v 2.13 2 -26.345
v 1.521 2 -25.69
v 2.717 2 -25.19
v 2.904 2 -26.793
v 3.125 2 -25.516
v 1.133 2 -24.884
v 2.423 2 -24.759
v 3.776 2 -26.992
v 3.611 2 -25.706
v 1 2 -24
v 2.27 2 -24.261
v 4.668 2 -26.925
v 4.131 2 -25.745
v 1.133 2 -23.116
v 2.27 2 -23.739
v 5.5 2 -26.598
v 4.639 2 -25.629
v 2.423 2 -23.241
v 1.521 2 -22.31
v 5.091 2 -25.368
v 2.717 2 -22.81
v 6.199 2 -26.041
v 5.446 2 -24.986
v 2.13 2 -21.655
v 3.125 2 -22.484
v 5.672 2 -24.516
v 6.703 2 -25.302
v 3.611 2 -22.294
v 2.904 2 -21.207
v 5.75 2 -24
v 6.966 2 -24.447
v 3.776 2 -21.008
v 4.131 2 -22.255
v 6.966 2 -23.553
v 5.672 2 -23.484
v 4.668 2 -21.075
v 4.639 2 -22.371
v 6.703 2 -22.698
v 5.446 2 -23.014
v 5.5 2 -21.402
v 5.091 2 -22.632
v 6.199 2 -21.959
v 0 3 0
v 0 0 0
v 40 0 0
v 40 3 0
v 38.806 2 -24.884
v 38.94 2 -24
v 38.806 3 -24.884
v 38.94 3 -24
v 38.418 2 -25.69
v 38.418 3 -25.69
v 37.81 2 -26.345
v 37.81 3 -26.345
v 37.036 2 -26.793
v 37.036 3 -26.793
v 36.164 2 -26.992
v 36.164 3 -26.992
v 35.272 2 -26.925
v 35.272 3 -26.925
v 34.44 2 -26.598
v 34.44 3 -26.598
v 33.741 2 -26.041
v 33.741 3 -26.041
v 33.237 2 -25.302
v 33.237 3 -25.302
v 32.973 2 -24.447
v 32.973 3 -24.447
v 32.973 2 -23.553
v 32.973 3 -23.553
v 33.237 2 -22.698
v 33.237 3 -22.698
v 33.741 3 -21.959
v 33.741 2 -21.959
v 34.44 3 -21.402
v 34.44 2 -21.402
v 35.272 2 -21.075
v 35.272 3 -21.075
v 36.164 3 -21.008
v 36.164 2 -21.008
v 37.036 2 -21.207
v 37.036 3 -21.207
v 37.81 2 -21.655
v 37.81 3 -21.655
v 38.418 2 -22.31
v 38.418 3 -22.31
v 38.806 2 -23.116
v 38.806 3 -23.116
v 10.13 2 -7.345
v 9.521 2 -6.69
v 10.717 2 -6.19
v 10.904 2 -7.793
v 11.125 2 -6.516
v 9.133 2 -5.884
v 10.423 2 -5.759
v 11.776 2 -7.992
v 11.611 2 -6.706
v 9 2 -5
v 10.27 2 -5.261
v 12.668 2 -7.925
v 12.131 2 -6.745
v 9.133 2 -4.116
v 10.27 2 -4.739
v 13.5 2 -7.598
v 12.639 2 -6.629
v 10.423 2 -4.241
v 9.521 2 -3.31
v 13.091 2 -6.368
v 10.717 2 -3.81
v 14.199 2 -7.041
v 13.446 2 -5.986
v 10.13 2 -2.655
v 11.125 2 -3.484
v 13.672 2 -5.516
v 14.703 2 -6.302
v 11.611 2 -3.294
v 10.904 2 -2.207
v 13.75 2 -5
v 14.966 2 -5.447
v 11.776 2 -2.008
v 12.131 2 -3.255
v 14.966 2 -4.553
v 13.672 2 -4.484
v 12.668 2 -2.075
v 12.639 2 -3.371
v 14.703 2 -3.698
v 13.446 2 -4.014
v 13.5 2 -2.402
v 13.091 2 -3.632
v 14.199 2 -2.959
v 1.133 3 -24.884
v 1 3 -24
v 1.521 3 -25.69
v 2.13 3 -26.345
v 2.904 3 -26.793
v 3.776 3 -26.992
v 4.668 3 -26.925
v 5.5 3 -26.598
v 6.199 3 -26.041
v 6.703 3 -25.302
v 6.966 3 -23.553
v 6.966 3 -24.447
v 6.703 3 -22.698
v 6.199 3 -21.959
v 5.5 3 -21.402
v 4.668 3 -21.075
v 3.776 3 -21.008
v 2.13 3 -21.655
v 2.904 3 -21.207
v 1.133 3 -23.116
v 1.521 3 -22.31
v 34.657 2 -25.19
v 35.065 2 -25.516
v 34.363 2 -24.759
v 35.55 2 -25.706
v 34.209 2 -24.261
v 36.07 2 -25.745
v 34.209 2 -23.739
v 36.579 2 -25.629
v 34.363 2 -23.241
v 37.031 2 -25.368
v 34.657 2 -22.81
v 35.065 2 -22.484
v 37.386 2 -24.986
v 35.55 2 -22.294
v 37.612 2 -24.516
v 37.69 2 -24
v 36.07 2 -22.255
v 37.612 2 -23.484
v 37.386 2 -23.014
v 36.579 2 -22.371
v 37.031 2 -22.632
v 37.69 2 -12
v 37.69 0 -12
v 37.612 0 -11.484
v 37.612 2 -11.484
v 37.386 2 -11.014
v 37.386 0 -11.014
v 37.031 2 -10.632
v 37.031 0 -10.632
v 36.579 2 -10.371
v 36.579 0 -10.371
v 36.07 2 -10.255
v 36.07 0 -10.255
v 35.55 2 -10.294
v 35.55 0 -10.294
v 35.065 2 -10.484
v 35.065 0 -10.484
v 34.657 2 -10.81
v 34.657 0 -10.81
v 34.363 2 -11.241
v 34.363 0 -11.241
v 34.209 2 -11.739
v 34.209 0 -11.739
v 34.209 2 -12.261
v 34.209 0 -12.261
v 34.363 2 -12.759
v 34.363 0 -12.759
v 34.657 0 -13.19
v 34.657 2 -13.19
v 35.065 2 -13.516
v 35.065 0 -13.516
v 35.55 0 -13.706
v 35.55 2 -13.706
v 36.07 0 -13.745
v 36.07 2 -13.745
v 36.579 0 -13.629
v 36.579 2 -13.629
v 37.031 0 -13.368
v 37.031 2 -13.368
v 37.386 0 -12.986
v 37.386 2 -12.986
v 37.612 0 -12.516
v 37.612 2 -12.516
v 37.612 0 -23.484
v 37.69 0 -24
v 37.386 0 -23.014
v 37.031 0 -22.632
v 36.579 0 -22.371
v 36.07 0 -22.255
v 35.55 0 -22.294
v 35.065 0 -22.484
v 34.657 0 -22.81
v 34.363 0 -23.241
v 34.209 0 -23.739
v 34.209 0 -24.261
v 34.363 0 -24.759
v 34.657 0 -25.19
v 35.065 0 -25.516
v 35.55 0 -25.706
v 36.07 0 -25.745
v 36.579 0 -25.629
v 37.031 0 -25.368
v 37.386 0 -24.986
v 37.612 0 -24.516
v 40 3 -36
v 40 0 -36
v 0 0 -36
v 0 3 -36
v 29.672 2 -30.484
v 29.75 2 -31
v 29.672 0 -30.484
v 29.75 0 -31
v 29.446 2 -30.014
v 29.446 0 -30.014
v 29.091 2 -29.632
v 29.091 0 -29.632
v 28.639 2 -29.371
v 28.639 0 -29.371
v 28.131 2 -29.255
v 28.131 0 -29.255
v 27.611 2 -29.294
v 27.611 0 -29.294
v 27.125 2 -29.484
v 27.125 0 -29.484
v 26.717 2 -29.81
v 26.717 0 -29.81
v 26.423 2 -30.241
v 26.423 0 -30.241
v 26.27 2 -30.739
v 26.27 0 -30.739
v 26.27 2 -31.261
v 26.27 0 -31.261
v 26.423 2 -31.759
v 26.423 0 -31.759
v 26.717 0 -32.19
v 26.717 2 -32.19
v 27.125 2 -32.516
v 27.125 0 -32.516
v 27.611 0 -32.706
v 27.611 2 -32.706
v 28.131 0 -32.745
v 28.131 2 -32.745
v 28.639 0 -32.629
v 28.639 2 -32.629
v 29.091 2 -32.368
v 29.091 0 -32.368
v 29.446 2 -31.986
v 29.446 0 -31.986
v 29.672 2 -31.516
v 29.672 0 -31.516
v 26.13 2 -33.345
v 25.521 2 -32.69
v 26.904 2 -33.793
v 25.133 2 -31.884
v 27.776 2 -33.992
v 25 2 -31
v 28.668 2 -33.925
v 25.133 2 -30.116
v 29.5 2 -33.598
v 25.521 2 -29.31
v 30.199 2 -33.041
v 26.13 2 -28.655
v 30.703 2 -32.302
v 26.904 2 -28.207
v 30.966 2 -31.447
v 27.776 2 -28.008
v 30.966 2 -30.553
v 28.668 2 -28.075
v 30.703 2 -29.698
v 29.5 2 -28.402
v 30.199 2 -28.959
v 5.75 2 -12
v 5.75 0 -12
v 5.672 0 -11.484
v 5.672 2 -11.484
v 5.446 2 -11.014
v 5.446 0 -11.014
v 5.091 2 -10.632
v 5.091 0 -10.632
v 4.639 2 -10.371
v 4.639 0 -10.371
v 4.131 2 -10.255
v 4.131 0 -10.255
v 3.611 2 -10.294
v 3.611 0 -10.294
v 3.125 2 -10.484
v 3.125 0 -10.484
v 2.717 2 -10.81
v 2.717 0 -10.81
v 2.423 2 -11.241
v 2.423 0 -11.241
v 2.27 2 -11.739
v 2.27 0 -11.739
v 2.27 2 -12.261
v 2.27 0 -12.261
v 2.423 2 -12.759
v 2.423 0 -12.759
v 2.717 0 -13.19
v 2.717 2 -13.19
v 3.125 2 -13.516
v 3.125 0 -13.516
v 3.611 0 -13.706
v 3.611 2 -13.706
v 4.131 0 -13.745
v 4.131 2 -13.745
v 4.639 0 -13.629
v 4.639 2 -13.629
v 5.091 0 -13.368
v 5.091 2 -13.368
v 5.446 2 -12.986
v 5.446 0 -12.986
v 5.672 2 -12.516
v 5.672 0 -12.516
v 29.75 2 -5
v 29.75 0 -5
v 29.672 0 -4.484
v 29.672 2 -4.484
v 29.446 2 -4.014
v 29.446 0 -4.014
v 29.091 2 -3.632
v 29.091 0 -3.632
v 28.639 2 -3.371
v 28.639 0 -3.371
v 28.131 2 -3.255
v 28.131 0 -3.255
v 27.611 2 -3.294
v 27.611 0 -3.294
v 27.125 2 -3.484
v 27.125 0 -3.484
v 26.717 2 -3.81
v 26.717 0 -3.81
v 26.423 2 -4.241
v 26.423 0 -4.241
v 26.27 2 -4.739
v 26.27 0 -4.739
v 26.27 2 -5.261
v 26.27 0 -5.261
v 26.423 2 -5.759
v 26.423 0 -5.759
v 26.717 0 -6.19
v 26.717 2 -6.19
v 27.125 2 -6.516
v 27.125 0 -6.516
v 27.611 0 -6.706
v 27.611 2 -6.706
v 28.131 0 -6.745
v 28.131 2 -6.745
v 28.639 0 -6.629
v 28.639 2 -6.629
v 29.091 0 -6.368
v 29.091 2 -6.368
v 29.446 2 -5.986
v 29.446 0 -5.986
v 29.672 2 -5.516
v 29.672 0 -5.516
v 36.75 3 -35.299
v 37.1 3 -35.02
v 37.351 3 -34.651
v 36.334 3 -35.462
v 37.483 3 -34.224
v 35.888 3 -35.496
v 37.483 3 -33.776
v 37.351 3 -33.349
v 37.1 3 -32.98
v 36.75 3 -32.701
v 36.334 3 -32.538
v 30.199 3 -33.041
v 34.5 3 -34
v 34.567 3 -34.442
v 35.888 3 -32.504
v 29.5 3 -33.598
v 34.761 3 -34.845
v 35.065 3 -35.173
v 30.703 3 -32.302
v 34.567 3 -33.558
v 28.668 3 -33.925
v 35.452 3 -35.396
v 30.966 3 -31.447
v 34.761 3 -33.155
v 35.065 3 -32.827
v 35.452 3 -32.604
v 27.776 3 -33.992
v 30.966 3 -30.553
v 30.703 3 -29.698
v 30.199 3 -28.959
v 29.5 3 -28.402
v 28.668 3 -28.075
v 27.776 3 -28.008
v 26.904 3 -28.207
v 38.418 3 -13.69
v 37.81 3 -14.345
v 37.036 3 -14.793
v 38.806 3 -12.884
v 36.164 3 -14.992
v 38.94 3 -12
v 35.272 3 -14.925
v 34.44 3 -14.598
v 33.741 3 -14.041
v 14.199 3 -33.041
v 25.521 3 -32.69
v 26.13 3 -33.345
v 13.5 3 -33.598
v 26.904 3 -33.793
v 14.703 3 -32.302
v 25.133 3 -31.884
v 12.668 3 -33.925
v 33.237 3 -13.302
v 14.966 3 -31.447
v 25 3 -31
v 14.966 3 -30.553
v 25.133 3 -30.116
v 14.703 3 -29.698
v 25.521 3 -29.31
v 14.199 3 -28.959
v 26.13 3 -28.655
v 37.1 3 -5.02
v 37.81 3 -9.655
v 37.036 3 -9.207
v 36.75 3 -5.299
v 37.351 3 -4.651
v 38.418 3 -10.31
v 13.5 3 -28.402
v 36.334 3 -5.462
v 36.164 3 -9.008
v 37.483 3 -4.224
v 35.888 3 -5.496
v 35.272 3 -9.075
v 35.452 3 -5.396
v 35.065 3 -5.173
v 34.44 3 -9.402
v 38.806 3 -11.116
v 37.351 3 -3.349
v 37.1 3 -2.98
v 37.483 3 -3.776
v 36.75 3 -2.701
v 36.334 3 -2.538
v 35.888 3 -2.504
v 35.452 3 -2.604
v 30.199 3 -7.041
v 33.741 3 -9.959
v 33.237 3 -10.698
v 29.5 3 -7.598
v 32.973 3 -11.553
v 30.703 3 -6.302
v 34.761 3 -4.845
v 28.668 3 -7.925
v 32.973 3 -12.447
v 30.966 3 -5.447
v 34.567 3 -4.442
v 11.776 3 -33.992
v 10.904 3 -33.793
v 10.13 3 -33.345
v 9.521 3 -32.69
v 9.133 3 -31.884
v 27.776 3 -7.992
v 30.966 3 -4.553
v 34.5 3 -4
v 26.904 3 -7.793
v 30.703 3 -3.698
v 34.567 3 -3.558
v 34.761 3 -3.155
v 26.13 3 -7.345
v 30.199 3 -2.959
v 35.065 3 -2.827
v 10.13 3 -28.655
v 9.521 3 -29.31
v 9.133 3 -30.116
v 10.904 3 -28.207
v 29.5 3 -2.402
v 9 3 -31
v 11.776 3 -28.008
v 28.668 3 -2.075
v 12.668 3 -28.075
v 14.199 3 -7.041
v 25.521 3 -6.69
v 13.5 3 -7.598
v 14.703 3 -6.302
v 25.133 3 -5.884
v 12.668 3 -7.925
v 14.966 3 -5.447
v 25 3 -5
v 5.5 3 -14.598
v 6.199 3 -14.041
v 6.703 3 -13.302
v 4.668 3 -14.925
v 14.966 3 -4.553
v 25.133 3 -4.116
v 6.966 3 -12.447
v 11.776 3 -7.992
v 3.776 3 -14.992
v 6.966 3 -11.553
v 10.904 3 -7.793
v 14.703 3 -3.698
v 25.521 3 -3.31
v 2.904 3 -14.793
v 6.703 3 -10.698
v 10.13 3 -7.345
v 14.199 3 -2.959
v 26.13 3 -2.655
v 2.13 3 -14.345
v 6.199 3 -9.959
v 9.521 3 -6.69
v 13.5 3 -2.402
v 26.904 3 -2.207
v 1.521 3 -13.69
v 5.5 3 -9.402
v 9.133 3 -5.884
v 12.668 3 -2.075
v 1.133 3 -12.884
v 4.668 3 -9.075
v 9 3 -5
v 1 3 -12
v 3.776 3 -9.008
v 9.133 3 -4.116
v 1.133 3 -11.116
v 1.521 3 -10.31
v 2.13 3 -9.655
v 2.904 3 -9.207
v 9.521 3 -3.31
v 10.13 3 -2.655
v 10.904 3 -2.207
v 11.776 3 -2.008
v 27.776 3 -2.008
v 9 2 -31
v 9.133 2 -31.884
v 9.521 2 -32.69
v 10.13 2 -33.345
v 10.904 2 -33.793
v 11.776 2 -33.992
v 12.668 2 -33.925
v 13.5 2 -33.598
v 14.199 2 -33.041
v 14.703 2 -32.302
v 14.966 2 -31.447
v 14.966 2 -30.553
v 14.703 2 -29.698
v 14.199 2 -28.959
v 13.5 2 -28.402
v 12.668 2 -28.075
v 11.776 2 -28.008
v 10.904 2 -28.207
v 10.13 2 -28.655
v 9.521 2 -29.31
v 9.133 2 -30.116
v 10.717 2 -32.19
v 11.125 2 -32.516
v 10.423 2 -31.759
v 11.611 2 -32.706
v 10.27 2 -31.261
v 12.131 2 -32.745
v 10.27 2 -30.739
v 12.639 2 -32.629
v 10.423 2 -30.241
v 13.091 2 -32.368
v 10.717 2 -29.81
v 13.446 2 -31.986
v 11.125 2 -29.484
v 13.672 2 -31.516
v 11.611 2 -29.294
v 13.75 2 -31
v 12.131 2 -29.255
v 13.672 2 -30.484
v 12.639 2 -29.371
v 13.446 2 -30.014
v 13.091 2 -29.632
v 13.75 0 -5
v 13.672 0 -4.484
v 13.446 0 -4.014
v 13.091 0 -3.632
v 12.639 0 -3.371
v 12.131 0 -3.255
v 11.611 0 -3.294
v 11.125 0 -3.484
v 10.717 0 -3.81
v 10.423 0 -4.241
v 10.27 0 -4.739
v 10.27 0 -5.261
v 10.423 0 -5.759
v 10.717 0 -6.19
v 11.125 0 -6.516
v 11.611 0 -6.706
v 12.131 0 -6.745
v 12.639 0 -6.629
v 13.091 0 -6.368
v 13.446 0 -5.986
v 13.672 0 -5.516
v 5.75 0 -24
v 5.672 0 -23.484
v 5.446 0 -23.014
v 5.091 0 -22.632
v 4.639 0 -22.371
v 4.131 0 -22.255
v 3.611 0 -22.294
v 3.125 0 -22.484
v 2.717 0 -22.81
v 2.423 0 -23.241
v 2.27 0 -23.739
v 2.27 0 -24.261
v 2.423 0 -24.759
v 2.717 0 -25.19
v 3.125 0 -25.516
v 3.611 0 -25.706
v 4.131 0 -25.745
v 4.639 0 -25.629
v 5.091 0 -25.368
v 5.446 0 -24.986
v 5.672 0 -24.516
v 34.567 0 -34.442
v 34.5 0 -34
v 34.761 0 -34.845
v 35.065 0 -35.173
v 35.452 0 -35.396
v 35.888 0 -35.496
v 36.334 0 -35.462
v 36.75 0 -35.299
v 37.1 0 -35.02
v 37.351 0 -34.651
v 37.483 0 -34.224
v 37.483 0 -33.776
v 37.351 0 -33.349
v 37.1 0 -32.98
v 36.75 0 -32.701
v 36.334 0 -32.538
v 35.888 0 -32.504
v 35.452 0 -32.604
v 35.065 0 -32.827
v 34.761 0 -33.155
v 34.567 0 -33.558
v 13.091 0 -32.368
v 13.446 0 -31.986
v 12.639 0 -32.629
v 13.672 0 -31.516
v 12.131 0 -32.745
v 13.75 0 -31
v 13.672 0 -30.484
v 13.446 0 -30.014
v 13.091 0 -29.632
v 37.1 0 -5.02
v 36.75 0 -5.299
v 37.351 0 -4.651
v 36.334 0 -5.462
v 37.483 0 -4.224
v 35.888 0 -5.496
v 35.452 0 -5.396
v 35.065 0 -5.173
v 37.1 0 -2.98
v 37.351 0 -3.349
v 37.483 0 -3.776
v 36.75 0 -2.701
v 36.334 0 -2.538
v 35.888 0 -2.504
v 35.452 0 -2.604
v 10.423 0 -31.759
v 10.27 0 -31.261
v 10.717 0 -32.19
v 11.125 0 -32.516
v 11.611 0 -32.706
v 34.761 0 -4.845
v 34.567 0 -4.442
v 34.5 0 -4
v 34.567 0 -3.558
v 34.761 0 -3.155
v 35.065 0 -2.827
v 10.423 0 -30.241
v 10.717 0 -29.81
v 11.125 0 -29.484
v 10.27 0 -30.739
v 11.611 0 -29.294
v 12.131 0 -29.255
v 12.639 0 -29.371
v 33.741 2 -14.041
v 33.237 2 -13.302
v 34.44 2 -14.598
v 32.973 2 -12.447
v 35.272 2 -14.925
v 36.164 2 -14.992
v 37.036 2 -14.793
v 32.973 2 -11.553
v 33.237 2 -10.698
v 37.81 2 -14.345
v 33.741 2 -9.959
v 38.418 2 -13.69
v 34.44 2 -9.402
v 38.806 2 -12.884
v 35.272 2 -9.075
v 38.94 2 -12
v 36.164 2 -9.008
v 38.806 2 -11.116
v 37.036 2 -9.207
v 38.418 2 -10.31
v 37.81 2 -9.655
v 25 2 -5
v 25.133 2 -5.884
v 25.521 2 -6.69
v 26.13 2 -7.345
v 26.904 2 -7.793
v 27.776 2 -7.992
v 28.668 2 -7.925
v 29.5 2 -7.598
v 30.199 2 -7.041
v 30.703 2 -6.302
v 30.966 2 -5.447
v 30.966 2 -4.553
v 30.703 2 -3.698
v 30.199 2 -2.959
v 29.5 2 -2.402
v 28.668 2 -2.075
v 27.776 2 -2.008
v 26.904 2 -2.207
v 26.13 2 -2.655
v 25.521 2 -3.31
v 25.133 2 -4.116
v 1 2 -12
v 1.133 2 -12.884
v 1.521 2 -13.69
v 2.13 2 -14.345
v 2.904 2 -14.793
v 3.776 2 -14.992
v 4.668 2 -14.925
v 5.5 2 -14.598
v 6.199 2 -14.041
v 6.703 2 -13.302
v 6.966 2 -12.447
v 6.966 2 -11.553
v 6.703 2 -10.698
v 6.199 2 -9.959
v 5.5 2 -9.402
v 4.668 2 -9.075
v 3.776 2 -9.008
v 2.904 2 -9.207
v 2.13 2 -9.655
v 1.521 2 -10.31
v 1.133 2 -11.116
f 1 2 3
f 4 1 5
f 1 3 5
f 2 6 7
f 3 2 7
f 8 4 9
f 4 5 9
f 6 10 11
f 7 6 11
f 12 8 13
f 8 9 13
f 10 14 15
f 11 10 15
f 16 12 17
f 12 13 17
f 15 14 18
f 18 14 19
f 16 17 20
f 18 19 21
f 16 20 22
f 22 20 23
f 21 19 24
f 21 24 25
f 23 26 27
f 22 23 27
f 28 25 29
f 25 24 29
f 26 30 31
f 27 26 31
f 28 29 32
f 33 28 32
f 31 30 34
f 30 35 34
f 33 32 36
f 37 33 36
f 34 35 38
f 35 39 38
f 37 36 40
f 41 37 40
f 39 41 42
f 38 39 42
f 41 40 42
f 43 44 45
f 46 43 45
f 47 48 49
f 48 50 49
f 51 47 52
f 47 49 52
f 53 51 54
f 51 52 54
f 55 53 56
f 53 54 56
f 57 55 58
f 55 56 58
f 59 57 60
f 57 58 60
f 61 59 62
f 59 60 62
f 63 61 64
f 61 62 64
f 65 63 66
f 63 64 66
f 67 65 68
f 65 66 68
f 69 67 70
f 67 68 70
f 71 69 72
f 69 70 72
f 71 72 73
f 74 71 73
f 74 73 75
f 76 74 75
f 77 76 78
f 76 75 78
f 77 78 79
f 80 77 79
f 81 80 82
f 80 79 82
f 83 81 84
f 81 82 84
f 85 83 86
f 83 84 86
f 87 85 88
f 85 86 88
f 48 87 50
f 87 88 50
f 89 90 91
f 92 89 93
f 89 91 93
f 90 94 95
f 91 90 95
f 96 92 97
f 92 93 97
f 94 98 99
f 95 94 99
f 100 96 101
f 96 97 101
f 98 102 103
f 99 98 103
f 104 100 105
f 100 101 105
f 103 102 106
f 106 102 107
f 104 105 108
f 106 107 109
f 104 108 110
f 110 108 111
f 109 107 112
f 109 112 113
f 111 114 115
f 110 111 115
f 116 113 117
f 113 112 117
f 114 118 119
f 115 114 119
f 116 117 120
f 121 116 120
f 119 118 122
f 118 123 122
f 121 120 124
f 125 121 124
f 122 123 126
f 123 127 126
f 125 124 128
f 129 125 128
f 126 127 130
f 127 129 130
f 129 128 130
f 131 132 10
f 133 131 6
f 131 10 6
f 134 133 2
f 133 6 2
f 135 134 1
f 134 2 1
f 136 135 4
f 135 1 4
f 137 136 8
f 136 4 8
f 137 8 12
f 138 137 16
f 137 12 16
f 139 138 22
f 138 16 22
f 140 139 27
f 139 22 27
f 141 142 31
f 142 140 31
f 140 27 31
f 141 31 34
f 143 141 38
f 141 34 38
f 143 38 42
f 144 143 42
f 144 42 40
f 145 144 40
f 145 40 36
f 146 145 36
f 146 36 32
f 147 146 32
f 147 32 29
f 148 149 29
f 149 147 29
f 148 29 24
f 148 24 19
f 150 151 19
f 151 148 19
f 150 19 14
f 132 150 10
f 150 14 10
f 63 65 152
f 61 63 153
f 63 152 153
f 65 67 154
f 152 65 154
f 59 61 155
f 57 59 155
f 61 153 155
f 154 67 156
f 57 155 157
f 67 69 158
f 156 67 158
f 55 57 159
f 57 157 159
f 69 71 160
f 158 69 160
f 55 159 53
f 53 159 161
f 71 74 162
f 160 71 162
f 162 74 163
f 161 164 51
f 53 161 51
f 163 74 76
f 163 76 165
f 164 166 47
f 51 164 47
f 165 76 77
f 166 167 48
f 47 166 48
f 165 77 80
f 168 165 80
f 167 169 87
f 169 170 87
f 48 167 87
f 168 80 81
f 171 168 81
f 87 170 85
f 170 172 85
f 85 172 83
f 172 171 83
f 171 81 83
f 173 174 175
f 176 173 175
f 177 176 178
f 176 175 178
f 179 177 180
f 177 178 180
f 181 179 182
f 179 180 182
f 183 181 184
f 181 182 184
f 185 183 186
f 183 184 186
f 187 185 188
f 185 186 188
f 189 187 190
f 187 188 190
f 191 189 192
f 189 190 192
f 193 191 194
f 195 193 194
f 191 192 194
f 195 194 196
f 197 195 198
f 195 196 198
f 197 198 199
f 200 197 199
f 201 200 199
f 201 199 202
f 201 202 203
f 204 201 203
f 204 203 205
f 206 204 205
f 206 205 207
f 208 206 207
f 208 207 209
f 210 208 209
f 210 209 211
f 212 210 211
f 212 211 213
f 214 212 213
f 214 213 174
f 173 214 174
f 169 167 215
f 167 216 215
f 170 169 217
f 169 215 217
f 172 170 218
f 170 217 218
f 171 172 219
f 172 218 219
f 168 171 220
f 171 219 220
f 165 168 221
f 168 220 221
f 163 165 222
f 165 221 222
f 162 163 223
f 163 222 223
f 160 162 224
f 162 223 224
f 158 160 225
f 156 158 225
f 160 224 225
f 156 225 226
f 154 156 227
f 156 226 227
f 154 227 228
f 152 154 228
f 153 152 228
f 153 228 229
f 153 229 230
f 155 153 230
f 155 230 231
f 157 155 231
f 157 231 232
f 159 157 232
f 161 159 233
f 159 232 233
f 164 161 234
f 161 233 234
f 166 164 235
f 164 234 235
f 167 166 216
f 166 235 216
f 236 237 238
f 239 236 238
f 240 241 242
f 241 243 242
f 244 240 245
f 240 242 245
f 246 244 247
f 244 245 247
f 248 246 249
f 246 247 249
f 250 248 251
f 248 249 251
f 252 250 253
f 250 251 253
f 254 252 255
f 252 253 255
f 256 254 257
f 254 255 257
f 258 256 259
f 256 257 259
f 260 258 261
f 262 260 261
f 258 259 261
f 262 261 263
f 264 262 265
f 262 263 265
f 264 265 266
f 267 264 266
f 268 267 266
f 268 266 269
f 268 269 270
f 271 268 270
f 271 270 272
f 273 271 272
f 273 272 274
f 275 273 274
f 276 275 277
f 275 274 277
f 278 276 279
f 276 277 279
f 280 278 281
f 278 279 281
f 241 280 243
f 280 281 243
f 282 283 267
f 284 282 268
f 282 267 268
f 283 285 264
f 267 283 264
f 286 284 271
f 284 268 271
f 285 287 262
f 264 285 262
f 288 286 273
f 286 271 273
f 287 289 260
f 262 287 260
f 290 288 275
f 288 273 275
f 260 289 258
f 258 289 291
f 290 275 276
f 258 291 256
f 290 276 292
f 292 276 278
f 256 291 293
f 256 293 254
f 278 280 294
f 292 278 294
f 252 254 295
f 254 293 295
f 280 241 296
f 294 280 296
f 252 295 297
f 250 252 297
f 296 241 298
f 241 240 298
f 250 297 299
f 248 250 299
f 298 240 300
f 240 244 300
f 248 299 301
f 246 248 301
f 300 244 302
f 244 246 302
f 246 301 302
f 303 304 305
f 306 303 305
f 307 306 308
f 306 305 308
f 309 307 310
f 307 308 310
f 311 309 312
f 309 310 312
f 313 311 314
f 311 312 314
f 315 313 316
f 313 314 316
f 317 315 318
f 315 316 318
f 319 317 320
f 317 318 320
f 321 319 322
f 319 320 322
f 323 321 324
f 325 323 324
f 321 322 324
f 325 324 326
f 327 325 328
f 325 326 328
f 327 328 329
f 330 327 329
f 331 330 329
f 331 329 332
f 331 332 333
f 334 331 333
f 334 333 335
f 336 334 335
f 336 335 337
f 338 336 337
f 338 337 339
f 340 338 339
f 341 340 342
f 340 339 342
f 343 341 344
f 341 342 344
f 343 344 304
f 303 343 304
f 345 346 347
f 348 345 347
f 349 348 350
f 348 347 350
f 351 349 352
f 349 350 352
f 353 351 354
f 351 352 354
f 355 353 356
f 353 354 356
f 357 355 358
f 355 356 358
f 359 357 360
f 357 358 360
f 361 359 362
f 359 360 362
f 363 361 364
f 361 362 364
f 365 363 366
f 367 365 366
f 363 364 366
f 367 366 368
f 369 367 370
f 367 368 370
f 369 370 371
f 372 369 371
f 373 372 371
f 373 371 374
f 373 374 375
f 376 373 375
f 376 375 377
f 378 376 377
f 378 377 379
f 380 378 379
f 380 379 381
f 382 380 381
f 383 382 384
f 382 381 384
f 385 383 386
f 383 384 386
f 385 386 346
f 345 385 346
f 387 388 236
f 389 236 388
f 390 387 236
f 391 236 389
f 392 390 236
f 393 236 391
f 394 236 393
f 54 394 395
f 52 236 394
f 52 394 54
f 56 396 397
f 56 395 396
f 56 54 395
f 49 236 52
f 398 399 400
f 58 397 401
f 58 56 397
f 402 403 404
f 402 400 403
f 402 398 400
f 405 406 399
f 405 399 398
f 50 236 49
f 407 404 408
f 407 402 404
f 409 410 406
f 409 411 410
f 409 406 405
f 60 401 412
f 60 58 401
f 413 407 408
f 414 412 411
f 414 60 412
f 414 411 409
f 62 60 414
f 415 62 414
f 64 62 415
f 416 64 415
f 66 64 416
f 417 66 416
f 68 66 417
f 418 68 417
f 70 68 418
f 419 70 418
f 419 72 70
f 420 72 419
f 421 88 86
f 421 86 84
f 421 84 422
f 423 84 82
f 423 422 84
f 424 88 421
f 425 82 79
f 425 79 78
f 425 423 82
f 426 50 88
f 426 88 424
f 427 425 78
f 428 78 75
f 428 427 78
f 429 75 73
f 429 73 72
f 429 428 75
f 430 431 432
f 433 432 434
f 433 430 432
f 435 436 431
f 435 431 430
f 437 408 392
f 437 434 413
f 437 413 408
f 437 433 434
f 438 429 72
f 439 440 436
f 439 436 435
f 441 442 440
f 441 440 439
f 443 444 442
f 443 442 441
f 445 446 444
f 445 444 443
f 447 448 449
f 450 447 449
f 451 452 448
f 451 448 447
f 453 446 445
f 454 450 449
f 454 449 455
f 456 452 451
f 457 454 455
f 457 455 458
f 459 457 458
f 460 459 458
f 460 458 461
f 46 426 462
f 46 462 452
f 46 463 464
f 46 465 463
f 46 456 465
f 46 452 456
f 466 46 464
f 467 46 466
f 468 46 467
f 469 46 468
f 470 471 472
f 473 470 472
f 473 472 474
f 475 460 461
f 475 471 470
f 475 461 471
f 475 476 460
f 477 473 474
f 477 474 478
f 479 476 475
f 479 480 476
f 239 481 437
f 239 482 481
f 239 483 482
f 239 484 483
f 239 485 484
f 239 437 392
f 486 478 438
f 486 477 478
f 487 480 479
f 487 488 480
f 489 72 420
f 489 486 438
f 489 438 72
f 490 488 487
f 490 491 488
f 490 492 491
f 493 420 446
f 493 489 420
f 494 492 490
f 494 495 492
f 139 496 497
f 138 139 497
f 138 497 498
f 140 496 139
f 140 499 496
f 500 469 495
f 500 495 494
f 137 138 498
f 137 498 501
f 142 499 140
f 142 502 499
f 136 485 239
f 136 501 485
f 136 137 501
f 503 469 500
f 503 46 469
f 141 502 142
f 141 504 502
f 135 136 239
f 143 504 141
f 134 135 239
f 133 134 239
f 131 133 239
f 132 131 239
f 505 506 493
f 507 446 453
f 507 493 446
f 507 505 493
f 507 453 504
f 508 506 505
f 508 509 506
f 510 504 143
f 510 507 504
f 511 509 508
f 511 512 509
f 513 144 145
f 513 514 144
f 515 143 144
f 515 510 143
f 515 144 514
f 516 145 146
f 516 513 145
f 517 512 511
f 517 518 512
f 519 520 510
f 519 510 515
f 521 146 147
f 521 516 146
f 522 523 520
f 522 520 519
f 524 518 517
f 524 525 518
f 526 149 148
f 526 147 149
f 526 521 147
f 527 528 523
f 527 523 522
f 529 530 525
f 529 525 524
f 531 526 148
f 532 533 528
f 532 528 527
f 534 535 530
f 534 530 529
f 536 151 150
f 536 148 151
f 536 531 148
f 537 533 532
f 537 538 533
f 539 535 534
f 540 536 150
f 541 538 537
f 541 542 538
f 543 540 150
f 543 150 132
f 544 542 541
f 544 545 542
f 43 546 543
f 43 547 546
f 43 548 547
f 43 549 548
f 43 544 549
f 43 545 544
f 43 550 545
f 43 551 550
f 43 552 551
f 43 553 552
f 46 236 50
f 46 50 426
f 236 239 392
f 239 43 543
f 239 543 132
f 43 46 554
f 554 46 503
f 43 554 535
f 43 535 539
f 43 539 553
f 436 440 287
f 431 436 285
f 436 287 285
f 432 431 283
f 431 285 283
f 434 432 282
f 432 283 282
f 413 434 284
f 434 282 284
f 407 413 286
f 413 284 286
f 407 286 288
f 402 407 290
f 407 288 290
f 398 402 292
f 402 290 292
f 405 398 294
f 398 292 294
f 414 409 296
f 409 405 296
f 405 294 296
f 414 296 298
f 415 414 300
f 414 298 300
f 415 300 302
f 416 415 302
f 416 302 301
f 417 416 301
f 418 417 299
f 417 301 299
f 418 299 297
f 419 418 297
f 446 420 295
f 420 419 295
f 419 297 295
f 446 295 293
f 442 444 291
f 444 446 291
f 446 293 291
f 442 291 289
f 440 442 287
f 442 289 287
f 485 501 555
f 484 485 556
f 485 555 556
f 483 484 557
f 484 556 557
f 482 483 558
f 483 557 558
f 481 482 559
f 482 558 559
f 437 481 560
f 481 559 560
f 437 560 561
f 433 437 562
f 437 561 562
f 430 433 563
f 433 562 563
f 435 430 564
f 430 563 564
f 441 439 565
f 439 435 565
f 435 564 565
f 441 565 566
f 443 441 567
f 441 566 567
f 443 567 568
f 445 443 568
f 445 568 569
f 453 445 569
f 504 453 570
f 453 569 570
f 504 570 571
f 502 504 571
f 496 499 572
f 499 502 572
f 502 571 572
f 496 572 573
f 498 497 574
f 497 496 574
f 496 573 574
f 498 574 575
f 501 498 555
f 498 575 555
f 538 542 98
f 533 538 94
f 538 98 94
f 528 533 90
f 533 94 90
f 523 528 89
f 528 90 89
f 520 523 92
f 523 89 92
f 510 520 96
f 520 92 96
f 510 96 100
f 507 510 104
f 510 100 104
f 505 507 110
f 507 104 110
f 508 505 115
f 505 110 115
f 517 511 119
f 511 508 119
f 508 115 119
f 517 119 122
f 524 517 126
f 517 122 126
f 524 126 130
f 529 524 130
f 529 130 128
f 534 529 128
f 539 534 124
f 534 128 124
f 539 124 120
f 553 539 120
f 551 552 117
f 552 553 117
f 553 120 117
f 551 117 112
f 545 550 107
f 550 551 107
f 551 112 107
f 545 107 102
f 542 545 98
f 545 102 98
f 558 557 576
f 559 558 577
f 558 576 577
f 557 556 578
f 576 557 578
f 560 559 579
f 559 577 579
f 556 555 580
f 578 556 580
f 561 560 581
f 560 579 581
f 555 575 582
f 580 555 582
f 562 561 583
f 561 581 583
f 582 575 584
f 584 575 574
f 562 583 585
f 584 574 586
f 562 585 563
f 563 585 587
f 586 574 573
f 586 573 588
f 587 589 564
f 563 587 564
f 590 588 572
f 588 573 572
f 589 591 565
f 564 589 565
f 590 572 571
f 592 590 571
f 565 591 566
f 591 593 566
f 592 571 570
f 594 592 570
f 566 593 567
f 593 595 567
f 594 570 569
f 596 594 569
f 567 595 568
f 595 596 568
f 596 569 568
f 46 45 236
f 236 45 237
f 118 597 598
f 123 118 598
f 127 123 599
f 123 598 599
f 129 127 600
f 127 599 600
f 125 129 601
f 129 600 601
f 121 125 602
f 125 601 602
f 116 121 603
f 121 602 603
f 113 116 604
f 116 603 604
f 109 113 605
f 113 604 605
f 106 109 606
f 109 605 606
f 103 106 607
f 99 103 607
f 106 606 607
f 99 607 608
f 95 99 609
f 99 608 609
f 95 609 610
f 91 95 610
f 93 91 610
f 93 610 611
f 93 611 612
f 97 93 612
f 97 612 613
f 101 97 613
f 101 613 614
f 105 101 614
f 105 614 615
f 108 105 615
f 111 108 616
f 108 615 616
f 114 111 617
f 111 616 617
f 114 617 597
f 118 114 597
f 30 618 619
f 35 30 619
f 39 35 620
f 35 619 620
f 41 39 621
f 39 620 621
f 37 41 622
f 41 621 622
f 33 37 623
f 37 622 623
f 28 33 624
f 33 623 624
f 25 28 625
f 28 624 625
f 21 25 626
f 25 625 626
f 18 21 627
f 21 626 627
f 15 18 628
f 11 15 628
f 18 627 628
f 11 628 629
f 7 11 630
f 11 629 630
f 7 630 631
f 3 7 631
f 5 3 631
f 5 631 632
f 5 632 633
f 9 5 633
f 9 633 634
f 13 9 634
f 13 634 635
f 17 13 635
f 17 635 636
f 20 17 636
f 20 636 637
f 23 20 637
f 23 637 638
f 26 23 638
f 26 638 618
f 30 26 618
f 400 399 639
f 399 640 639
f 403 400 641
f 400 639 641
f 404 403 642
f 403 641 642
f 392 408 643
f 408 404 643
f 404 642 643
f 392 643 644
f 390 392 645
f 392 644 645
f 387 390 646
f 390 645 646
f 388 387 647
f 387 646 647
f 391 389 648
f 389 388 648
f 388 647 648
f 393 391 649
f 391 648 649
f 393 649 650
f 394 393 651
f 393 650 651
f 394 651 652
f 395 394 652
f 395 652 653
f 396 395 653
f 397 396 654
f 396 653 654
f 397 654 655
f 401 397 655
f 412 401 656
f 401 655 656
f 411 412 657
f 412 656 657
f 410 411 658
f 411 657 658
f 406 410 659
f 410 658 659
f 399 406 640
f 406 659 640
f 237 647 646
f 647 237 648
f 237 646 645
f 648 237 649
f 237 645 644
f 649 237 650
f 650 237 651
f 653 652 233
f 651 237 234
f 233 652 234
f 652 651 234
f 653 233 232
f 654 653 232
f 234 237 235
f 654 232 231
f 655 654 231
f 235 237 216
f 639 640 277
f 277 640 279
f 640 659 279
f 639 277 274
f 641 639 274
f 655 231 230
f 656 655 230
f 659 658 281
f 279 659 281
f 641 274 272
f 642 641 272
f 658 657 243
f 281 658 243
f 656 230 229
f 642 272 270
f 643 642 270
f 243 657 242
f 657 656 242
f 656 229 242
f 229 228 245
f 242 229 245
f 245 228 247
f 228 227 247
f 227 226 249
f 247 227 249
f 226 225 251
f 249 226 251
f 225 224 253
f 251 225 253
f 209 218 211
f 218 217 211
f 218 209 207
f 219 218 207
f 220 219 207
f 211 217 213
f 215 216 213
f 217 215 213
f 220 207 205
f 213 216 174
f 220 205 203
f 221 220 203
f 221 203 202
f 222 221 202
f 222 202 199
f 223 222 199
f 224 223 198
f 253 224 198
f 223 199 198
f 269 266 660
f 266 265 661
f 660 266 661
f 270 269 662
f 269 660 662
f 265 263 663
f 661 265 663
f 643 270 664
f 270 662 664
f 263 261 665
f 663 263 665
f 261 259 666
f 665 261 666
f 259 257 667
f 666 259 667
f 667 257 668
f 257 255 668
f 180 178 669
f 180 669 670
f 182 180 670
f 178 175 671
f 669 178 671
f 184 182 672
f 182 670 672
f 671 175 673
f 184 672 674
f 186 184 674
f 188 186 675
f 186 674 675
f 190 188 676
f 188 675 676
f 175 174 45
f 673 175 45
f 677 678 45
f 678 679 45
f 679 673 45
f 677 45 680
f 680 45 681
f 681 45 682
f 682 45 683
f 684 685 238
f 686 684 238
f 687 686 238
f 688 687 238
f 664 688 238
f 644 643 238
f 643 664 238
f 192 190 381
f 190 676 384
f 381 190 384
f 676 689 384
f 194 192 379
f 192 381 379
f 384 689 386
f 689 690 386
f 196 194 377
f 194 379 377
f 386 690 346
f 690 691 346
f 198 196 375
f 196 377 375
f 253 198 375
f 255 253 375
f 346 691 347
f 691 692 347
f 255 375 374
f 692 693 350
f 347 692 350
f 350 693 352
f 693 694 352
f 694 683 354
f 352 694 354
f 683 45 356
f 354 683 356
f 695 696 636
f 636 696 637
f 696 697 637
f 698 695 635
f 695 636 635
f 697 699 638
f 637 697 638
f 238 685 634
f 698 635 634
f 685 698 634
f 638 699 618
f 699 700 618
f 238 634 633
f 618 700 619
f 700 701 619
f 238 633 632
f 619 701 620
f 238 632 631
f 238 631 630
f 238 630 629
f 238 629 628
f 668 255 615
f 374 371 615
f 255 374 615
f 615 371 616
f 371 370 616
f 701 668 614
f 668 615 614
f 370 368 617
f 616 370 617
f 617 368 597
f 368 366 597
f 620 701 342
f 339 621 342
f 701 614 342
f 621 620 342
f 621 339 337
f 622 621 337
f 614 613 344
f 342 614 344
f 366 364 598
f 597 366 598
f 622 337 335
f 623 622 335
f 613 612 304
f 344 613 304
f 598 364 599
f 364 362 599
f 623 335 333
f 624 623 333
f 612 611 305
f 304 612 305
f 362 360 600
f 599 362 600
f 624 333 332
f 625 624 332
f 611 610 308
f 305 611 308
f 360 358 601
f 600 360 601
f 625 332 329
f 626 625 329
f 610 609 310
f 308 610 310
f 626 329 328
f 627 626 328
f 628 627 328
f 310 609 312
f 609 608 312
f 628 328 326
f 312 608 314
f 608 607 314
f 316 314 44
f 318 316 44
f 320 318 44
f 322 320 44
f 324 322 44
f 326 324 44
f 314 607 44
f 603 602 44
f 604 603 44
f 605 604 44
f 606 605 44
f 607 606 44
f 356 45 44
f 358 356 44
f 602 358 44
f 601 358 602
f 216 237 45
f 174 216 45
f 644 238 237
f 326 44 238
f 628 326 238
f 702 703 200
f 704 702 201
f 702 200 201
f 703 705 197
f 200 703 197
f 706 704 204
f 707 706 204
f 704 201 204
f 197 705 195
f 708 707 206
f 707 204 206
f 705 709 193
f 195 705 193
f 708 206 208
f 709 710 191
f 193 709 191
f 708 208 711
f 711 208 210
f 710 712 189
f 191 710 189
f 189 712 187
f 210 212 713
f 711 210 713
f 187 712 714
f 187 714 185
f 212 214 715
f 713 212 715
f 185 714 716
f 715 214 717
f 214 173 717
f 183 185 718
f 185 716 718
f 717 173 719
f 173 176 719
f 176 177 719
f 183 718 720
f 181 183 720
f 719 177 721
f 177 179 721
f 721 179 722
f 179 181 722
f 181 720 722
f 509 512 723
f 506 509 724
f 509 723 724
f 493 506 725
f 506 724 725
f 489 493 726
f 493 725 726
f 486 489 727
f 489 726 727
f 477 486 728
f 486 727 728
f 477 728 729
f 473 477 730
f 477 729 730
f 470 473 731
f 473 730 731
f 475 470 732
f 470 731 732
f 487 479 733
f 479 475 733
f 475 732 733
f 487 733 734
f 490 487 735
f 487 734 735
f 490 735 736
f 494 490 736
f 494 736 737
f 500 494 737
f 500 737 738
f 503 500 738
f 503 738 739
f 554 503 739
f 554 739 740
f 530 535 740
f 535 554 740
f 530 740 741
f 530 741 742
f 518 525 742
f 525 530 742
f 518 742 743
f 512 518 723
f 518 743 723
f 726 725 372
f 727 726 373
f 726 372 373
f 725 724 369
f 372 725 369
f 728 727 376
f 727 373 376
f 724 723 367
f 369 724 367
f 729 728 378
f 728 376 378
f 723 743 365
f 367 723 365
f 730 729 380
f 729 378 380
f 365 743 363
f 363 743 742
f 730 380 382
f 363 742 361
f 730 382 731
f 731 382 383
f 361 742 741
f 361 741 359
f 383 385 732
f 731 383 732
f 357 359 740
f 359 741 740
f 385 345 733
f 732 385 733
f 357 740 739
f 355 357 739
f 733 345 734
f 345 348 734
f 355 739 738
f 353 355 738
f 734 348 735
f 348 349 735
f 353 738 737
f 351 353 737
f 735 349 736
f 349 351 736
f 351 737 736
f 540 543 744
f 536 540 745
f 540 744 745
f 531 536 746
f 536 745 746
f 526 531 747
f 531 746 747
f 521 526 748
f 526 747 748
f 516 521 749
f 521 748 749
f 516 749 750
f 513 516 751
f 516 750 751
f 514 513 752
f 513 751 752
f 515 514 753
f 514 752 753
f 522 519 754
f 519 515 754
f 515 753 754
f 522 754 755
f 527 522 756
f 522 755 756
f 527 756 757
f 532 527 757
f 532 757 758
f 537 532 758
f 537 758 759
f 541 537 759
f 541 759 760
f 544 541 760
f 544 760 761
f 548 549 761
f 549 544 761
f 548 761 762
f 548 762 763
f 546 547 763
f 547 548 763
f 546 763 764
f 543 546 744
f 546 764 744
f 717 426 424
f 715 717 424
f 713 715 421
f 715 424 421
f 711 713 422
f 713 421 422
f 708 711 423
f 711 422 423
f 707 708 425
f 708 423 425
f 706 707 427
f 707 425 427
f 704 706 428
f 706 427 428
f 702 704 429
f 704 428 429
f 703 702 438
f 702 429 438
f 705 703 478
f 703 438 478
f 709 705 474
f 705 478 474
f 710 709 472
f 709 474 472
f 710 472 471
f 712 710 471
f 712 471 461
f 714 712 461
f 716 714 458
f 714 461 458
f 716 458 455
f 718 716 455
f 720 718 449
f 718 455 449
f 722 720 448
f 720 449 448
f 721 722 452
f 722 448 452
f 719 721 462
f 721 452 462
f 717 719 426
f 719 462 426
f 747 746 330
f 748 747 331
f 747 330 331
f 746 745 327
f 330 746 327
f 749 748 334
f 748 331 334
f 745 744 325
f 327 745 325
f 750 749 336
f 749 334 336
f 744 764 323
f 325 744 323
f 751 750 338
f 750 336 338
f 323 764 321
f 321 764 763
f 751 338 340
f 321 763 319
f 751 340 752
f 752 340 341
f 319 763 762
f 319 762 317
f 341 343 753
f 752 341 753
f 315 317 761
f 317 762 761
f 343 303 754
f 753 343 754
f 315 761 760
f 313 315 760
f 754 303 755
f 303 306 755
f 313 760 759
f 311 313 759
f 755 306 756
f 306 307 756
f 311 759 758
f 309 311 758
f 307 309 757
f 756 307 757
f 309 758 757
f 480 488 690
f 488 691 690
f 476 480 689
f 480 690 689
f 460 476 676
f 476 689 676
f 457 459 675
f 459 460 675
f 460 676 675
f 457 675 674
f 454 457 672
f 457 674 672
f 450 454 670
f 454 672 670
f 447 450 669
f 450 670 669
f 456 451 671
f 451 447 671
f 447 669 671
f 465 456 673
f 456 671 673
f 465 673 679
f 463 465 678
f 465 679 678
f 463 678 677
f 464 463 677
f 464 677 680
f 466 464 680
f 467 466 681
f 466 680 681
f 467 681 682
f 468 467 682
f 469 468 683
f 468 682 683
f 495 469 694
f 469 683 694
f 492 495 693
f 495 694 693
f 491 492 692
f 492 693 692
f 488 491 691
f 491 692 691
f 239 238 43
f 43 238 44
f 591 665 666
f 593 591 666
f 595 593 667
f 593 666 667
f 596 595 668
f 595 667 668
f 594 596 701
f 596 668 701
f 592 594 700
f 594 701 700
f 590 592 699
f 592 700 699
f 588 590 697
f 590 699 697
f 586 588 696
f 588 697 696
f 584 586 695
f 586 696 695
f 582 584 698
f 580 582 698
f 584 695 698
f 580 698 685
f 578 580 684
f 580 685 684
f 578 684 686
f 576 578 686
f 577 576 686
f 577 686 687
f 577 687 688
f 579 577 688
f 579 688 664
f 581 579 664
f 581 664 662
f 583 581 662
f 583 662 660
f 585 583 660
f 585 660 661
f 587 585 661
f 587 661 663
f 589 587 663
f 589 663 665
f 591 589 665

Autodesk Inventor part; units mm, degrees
ref_plane "YZ Plane" through (0, 0, 0) normal (1, 0, 0) x (0, 1, 0)
ref_plane "XZ Plane" through (0, 0, 0) normal (0, 1, 0) x (-1, 0, 0)
ref_plane "XY Plane" through (0, 0, 0) normal (0, 0, 1) x (1, 0, 0)
sketch "Sketch1" plane through (0, 0, 0) normal (0, 1, 0) x (-1, 0, 0)
  line L0 (0, 0) -> (-40, 0)
  line L1 (-40, 0) -> (-40, -36)
  line L2 (-40, -36) -> (0, -36)
  line L3 (0, -36) -> (0, 0)
  line L4 (0, 0) -> (0, -5)
  circle A0 centre (-12, -5) radius 3
  circle A1 centre (-28, -5) radius 3
  line L5 (0, 0) -> (-4, 0)
  circle A2 centre (-4, -12) radius 3
  line L6 (-40, 0) -> (-36, 0)
  line L7 (-40, -4) -> (-40, 0)
  circle A3 centre (-36, -4) radius 1.5
  circle A4 centre (-4, -24) radius 3
  circle A5 centre (-12, -31) radius 3
  circle A6 centre (-28, -31) radius 3
  circle A7 centre (-36, -34) radius 1.5
  dimension "d0" = 40
  dimension "d1" = 36
  dimension "d11" = 6
  dimension "d13" = 0
  dimension "d14" = 0
  dimension "d15" = 5
  dimension "d16" = 4
  dimension "d17" = 4
  dimension "d18" = 12
  dimension "d19" = 4
  dimension "d20" = 24
  dimension "d21" = 12
  dimension "d22" = 5
  dimension "d23" = 12
  dimension "d24" = 31
  dimension "d25" = 28
  dimension "d26" = 5
  dimension "d27" = 28
  dimension "d29" = 36
  dimension "d30" = 36
  dimension "d31" = 4
  dimension "d32" = 36
  dimension "d34" = 4
  dimension "d88" = 30
  dimension "d89" = 3
extrude "Extrusion1" add sketch "Sketch1" along normal blind 3
sketch "Sketch2" plane through (0, 3, 0) normal (0, 1, 0) x (1, 0, 0)
  line L0 (39.9397, 0) -> (35.9397, 0)
  line L1 (0, 0) -> (40, 0)
  line L2 (35.9397, 0) -> (35.9397, 12)
  line L3 (35.9397, 12) -> (35.9397, 24)
  circle A0 centre (35.9397, 12) radius 3
  circle A1 centre (35.9397, 24) radius 3
  dimension "d4" = 4
  dimension "d5" = 12
  dimension "d6" = 12
  dimension "d7" = 6
  dimension "d8" = 6
  dimension "d35" = 0
  dimension "d36" = 35.9397
  dimension "d37" = 4.0603
  dimension "d38" = 35.9397
extrude "Extrusion2" cut sketch "Sketch2" against normal blind 3
sketch "Sketch5" plane through (0, 0, 0) normal (0, -1, 0) x (1, 0, 0)
  circle A0 centre (12, -5) radius 1.75
  circle A1 centre (12, -5) radius 3 projected
  circle A2 centre (12, -5) radius 3
  circle A3 centre (28, -5) radius 1.75
  circle A4 centre (28, -5) radius 3 projected
  circle A5 centre (28, -5) radius 3
  circle A6 centre (4, -12) radius 1.75
  circle A7 centre (4, -12) radius 3 projected
  circle A8 centre (4, -12) radius 3
  circle A9 centre (35.9397, -12) radius 1.75
  circle A10 centre (35.9397, -12) radius 3 projected
  circle A11 centre (35.9397, -24) radius 3 projected
  circle A12 centre (28, -31) radius 3 projected
  circle A13 centre (12, -31) radius 3 projected
  circle A14 centre (4, -24) radius 3 projected
  circle A15 centre (4, -12) radius 3 projected
  circle A16 centre (28, -5) radius 3 projected
  circle A17 centre (12, -5) radius 3 projected
  circle A18 centre (36, -34) radius 1.5 projected
  circle A19 centre (36, -4) radius 1.5 projected
  line L0 (0, 0) -> (40, 0) projected
  line L1 (0, -36) -> (0, 0) projected
  line L2 (40, -36) -> (0, -36) projected
  line L3 (40, 0) -> (40, -36) projected
  circle A20 centre (35.9397, -12) radius 3
  circle A21 centre (35.9397, -24) radius 1.75
  circle A22 centre (35.9397, -24) radius 3
  circle A23 centre (28, -31) radius 1.75
  circle A24 centre (28, -31) radius 3
  circle A25 centre (12, -31) radius 1.75
  circle A26 centre (12, -31) radius 3
  circle A27 centre (4, -24) radius 1.75
  circle A28 centre (4, -24) radius 3 projected
  circle A29 centre (4, -24) radius 3
  point P0 (-35.9397, 24)
  point P1 (-28, 31)
  point P2 (-28, 31)
  point P3 (-28, 31)
  dimension "d39" = 3.5
  dimension "d40" = 0
  dimension "d41" = 0
  dimension "d42" = 3.5
  dimension "d43" = 0
  dimension "d44" = 0
  dimension "d45" = 6
  dimension "d46" = 3.5
  dimension "d47" = 0
  dimension "d48" = 0
  dimension "d49" = 6
  dimension "d50" = 3.5
  dimension "d51" = 0
  dimension "d52" = 0
  dimension "d53" = 6
  dimension "d54" = 3.5
  dimension "d55" = 0
  dimension "d56" = 0
  dimension "d57" = 6
  dimension "d58" = 3.5
  dimension "d59" = 0
  dimension "d60" = 0
  dimension "d61" = 6
  dimension "d62" = 3.5
  dimension "d63" = 0
  dimension "d64" = 0
  dimension "d65" = 6
  dimension "d66" = 3.5
  dimension "d67" = 0
  dimension "d68" = 0
  dimension "d69" = 6
  dimension "d74" = 68
  dimension "d75" = 67
  dimension "d76" = 68
  dimension "d77" = 67
  dimension "d78" = 68
  dimension "d79" = 67
  dimension "d80" = 75.9397
  dimension "d81" = 60
extrude "Extrusion4" add sketch "Sketch5" against normal blind 2 contours A1 | A4 | A7 | A10 | A11 | A12 | A13 | A14
properties part number "reverse gear steam chest cover"
